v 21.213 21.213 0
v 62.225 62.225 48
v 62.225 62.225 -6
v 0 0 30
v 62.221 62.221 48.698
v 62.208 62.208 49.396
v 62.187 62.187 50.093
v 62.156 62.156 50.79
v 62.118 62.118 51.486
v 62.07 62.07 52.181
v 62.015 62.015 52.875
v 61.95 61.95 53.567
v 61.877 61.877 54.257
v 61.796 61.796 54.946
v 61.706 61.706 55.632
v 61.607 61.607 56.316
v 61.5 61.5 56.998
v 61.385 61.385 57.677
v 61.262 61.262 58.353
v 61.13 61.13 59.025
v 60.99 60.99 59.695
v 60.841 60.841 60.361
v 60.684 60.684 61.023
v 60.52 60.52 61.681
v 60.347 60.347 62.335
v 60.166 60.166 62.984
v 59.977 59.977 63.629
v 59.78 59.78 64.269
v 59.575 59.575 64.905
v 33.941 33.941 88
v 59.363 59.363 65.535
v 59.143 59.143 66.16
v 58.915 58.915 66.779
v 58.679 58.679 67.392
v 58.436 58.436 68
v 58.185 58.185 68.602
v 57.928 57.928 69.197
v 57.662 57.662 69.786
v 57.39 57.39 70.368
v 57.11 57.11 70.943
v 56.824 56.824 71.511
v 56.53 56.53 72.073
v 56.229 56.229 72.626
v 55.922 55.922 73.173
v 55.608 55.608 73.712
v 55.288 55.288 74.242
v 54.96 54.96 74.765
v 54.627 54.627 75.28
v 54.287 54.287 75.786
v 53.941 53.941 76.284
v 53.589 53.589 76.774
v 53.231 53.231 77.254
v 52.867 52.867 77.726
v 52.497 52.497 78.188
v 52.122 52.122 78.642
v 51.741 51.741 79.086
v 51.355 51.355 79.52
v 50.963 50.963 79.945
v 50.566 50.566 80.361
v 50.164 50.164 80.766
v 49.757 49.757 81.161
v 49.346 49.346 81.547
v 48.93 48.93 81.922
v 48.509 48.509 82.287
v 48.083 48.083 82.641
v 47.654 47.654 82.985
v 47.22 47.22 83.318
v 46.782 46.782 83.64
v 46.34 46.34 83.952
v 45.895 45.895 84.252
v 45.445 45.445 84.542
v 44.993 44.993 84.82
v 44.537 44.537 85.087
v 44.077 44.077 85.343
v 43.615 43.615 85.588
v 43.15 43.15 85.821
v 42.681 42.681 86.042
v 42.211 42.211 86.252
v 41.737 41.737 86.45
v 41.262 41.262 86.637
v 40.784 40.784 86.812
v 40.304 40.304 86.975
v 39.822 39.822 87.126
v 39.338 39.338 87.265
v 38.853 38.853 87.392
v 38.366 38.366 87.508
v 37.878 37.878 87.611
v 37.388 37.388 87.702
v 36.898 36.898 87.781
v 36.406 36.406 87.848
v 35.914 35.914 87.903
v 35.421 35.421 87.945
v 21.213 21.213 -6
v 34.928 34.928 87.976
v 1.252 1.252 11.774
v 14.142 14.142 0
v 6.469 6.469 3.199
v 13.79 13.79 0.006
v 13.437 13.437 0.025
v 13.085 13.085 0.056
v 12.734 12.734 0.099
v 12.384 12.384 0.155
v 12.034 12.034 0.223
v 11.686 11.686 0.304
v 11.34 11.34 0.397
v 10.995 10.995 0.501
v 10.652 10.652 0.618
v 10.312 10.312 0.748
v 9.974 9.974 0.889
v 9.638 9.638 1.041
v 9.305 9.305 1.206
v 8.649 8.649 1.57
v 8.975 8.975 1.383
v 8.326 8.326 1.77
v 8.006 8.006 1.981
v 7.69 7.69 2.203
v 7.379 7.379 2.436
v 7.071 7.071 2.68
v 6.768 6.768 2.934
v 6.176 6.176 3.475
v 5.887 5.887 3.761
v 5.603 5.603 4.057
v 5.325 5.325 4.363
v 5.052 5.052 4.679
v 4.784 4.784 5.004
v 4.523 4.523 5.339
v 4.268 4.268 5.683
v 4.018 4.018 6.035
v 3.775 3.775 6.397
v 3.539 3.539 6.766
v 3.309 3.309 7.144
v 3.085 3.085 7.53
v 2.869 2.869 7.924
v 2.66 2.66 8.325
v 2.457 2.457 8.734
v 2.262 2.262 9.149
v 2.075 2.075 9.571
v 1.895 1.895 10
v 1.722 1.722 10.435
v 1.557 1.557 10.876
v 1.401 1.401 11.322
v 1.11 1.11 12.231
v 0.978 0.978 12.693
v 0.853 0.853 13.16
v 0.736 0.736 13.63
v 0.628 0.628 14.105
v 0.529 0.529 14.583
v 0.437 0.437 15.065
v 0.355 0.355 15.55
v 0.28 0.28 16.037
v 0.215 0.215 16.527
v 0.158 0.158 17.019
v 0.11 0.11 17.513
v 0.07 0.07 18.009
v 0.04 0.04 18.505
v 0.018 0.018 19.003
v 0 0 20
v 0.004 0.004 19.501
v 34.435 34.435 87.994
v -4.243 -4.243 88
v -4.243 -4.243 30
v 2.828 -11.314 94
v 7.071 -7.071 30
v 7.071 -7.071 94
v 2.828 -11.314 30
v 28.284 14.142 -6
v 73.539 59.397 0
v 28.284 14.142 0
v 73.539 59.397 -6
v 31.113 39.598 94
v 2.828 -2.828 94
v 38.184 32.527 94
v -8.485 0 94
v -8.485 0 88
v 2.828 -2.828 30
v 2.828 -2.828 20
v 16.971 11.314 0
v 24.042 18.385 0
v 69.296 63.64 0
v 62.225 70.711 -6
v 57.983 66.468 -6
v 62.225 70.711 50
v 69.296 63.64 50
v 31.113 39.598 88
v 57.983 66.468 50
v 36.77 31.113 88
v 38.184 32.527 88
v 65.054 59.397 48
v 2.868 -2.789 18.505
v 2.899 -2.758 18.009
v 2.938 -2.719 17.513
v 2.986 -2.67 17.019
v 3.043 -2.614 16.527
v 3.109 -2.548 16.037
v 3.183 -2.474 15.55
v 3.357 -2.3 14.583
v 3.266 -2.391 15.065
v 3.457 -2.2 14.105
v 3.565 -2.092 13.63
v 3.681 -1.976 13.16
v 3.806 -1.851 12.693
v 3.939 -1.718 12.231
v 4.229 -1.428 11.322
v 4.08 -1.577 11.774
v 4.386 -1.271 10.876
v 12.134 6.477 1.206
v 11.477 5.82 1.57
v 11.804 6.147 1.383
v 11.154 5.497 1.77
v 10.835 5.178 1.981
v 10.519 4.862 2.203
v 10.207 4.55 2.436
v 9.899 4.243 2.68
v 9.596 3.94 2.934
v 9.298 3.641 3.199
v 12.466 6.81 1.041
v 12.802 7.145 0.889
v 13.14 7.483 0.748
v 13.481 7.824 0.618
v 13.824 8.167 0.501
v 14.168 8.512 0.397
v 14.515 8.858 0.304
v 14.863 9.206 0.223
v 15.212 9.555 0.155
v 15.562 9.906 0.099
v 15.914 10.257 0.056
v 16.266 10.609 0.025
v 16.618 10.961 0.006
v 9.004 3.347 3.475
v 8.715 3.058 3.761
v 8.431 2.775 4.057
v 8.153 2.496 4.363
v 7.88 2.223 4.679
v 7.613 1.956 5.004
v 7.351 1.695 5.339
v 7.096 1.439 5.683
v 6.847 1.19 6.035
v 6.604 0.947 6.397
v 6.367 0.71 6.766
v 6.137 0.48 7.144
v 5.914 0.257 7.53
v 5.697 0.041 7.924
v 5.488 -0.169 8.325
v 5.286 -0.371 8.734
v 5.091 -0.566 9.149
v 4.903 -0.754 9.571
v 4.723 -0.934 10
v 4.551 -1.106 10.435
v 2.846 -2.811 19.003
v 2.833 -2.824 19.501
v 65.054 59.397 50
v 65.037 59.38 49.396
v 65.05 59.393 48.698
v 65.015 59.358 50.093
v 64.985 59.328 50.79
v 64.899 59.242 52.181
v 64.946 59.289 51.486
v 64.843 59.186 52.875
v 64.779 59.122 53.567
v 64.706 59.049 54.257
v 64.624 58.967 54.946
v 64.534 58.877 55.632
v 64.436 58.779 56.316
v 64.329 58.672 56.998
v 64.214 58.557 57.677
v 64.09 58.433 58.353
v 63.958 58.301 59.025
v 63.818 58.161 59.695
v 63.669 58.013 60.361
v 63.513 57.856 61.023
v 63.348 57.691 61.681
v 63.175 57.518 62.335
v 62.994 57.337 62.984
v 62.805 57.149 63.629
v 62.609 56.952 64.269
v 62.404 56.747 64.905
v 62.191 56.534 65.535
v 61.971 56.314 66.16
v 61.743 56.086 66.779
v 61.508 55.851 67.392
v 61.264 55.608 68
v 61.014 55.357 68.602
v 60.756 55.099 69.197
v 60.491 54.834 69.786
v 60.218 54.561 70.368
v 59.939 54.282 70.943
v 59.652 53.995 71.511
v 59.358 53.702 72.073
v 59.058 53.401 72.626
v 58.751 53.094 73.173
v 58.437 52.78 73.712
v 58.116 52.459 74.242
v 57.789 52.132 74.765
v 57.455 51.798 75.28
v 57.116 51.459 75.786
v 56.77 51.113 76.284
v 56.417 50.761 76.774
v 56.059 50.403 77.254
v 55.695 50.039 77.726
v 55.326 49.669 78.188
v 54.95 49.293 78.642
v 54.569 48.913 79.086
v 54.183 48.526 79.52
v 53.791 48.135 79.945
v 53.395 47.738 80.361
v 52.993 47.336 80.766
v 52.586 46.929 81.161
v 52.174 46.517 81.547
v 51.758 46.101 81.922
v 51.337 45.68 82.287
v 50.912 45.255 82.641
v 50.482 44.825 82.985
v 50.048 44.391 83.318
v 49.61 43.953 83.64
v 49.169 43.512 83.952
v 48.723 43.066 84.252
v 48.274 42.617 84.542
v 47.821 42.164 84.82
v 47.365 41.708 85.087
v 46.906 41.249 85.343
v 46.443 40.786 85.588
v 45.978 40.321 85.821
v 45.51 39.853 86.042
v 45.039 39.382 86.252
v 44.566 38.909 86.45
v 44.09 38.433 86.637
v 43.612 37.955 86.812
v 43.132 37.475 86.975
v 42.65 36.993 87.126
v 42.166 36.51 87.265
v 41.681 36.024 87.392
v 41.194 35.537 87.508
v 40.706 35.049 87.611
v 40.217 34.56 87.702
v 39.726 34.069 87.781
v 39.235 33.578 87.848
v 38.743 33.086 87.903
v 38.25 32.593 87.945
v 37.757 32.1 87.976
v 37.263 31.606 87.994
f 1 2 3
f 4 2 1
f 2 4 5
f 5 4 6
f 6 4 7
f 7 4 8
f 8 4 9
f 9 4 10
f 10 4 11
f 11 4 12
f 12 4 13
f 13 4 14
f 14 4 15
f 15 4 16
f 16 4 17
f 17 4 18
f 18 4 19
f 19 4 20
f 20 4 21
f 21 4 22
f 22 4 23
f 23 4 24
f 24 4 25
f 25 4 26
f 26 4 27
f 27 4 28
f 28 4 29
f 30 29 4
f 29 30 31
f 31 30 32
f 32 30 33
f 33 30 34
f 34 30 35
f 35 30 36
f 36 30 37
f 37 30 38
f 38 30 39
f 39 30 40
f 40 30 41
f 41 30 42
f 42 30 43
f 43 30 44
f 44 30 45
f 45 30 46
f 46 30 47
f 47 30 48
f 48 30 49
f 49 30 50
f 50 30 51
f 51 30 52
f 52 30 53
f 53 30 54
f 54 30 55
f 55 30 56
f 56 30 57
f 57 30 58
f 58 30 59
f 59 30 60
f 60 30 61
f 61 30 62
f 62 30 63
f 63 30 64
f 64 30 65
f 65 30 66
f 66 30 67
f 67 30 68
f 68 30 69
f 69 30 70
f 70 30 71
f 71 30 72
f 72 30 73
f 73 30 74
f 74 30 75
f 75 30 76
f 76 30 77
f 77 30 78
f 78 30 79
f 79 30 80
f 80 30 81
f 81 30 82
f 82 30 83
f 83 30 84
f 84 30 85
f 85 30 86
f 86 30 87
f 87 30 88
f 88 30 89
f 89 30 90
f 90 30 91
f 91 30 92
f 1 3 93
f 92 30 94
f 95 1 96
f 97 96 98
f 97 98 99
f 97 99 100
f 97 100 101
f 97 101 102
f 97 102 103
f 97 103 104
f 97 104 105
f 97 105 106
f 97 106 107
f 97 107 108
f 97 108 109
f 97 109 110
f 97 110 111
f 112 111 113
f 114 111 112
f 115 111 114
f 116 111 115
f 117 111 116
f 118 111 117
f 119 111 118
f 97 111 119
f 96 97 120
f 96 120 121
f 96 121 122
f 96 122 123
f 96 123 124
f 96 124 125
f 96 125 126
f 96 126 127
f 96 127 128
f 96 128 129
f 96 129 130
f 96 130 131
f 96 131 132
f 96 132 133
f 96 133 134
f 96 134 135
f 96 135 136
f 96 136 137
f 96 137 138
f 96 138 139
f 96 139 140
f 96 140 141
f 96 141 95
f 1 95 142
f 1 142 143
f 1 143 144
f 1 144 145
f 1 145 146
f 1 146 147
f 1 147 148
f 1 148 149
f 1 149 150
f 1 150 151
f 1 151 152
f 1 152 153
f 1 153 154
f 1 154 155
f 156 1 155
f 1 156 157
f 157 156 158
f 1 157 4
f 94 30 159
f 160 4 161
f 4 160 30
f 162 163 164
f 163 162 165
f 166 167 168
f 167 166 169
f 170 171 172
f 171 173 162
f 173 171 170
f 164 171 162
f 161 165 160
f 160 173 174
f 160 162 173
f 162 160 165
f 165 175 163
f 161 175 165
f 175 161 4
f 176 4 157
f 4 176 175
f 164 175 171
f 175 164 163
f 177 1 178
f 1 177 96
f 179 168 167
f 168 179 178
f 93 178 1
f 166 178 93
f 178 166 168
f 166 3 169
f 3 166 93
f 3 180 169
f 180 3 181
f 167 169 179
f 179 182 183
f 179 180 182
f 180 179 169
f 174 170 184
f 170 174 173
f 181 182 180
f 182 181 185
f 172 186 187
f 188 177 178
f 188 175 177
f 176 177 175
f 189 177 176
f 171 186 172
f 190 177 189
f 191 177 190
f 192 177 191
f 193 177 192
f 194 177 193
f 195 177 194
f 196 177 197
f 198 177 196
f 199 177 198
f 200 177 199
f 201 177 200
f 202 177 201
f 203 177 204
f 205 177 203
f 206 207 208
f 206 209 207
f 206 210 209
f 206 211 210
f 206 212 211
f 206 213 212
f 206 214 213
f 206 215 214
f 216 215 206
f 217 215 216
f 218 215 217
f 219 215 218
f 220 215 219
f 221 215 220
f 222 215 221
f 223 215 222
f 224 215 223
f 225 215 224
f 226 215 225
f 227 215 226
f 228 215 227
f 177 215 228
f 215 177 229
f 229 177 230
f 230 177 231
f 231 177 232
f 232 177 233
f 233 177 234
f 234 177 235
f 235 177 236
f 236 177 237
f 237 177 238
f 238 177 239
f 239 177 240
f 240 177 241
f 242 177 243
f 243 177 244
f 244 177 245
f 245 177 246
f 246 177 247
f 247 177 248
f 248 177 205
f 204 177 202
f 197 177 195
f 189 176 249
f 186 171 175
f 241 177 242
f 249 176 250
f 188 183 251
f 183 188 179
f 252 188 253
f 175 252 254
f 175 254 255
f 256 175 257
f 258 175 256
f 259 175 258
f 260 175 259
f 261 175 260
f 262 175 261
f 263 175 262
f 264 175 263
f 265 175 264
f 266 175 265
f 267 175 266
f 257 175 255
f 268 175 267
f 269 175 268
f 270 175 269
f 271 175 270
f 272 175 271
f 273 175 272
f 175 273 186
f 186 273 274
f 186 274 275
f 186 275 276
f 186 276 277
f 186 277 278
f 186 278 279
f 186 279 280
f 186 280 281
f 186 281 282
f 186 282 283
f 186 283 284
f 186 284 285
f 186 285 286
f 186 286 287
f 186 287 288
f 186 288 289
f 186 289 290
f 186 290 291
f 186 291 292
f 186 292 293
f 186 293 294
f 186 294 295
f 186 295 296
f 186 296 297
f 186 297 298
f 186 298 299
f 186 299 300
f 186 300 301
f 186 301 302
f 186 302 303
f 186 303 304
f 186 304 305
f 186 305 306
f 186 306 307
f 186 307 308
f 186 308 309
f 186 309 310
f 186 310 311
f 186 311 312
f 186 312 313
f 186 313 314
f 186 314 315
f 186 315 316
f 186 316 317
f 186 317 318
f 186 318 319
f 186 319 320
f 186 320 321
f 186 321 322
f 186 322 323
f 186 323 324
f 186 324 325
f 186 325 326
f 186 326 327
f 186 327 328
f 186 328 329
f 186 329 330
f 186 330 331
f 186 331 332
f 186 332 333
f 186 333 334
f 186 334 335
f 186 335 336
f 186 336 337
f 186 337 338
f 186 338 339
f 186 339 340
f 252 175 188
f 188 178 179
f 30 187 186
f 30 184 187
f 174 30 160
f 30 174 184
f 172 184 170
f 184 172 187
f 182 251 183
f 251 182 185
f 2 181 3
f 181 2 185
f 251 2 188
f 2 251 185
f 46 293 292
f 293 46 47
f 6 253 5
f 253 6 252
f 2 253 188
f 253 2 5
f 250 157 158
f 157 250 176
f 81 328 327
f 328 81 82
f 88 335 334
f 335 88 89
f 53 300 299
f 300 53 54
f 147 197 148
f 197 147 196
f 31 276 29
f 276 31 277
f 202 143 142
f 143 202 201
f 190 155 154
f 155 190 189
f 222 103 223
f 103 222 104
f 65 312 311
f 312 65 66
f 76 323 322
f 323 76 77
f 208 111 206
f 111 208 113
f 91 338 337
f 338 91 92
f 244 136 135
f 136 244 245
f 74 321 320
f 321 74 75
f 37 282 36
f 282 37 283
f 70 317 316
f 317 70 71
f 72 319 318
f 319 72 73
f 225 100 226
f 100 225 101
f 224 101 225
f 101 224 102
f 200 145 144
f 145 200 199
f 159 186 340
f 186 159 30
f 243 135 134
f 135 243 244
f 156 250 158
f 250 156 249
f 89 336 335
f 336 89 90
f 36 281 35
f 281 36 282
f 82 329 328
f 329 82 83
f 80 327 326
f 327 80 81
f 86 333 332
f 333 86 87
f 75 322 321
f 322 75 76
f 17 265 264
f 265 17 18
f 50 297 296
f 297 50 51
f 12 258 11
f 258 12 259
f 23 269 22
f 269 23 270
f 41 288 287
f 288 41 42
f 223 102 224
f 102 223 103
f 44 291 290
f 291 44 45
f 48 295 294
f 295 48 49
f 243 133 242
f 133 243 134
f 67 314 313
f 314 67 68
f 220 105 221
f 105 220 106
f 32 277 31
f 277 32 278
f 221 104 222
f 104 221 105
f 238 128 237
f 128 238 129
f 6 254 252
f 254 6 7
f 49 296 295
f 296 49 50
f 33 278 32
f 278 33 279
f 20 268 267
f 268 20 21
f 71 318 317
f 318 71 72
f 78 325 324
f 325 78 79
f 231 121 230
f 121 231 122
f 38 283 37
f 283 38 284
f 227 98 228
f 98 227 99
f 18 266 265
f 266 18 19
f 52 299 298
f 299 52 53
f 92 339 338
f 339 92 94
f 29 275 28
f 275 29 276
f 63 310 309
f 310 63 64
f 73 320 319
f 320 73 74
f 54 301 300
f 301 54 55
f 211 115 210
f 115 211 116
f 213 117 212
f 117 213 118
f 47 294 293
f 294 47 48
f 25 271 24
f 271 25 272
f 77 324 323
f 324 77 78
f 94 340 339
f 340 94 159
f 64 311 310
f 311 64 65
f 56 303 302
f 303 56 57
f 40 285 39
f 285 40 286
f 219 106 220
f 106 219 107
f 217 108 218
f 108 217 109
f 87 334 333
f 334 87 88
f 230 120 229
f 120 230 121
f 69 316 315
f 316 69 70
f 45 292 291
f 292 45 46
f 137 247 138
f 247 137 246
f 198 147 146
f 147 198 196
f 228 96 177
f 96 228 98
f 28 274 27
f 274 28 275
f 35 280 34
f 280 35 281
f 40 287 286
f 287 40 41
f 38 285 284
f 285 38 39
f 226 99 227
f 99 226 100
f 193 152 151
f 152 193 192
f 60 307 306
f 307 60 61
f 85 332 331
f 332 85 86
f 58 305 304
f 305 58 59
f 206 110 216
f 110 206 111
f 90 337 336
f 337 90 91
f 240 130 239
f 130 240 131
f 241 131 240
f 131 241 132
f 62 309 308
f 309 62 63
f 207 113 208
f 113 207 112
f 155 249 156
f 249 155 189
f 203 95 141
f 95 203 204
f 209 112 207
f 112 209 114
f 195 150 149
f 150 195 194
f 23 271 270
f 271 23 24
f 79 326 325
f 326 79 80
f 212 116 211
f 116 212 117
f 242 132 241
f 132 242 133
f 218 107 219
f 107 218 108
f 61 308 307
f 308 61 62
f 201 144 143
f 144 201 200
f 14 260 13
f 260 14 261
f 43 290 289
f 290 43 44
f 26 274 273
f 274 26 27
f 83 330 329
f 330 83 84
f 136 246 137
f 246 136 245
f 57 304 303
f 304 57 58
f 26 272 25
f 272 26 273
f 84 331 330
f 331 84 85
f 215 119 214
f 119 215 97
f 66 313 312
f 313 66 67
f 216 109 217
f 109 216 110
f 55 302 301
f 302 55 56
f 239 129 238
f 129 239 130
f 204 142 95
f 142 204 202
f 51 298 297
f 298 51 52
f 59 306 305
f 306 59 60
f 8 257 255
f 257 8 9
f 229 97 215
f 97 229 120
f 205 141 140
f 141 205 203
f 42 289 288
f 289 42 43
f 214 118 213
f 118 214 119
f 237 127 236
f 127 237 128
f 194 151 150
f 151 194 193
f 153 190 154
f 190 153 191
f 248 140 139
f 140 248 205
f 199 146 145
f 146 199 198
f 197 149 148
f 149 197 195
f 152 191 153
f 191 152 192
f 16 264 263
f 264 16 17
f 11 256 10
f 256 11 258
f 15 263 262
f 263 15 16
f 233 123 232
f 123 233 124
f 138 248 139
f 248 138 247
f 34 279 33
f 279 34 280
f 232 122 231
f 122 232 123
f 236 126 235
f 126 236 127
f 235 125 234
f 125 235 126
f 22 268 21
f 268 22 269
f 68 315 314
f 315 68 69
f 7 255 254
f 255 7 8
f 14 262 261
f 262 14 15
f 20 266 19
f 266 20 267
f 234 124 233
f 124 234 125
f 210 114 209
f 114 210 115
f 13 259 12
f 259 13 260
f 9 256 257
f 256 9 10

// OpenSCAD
/******************************************************************************
 *
 *  GLOBALS
 *
 ******************************************************************************/


width = 100;
thickness = 4;
wallThickness = 6;
wallHeight = 10;
wallCornerDistance = 10;
radius1 = 20;
radius2 = 40;

/* [Hidden] */
$fa = 1;
$fs = 0.5;


/******************************************************************************
 *
 *  EXECUTION
 *
 ******************************************************************************/


rotate([90, 0, 45])
{
    plate();
    walls();
}

/***************************************************************************
 *
 *  DIRECT MODULES
 *
 ******************************************************************************/

module plate()
{
    linear_extrude(thickness)
        _platePlane();
}

module walls()
{
    linear_extrude(wallHeight)
        _wallsPlane1();

    translate([0, 0, thickness - wallHeight])        
        linear_extrude(wallHeight)
            _wallsPlane2();
}

/******************************************************************************
 *
 *  HELPER AND COMPONENT MODULES
 *
 ******************************************************************************/

module _platePlane()
{
    difference()
    {
        square(width - 2 * wallThickness);
        _roundingsPlane();
    }
}

module _roundingsPlane()
{
    _cornerRoundingPlane(radius1);
    translate([width - 2 * wallThickness, width - 2 * wallThickness, 0])
        rotate([0, 0, 180])
            _cornerRoundingPlane(radius2);
}

module _cornerRoundingPlane(radius)
{
    translate([radius, radius, 0])
        rotate([0, 0, 180])
            difference()
            {
                square(radius + 1);
                circle(r = radius);
            }
}

module _wallsPlane1()
{
    translate([-wallThickness, radius1 + wallCornerDistance, 0])
        square([wallThickness, width - radius1 - wallCornerDistance - wallThickness ]);
    translate([radius1 + wallCornerDistance, -wallThickness, 0])
            square([width - radius1 - wallCornerDistance - wallThickness, wallThickness]);
}

module _wallsPlane2()
{
    translate([width - 2 * wallThickness, -wallThickness, 0])
            square([wallThickness, width - radius2 - wallCornerDistance + wallThickness]);
    translate([-wallThickness, width - 2 * wallThickness, 0])
            square([width - radius2 - wallCornerDistance + wallThickness, wallThickness]);
}
